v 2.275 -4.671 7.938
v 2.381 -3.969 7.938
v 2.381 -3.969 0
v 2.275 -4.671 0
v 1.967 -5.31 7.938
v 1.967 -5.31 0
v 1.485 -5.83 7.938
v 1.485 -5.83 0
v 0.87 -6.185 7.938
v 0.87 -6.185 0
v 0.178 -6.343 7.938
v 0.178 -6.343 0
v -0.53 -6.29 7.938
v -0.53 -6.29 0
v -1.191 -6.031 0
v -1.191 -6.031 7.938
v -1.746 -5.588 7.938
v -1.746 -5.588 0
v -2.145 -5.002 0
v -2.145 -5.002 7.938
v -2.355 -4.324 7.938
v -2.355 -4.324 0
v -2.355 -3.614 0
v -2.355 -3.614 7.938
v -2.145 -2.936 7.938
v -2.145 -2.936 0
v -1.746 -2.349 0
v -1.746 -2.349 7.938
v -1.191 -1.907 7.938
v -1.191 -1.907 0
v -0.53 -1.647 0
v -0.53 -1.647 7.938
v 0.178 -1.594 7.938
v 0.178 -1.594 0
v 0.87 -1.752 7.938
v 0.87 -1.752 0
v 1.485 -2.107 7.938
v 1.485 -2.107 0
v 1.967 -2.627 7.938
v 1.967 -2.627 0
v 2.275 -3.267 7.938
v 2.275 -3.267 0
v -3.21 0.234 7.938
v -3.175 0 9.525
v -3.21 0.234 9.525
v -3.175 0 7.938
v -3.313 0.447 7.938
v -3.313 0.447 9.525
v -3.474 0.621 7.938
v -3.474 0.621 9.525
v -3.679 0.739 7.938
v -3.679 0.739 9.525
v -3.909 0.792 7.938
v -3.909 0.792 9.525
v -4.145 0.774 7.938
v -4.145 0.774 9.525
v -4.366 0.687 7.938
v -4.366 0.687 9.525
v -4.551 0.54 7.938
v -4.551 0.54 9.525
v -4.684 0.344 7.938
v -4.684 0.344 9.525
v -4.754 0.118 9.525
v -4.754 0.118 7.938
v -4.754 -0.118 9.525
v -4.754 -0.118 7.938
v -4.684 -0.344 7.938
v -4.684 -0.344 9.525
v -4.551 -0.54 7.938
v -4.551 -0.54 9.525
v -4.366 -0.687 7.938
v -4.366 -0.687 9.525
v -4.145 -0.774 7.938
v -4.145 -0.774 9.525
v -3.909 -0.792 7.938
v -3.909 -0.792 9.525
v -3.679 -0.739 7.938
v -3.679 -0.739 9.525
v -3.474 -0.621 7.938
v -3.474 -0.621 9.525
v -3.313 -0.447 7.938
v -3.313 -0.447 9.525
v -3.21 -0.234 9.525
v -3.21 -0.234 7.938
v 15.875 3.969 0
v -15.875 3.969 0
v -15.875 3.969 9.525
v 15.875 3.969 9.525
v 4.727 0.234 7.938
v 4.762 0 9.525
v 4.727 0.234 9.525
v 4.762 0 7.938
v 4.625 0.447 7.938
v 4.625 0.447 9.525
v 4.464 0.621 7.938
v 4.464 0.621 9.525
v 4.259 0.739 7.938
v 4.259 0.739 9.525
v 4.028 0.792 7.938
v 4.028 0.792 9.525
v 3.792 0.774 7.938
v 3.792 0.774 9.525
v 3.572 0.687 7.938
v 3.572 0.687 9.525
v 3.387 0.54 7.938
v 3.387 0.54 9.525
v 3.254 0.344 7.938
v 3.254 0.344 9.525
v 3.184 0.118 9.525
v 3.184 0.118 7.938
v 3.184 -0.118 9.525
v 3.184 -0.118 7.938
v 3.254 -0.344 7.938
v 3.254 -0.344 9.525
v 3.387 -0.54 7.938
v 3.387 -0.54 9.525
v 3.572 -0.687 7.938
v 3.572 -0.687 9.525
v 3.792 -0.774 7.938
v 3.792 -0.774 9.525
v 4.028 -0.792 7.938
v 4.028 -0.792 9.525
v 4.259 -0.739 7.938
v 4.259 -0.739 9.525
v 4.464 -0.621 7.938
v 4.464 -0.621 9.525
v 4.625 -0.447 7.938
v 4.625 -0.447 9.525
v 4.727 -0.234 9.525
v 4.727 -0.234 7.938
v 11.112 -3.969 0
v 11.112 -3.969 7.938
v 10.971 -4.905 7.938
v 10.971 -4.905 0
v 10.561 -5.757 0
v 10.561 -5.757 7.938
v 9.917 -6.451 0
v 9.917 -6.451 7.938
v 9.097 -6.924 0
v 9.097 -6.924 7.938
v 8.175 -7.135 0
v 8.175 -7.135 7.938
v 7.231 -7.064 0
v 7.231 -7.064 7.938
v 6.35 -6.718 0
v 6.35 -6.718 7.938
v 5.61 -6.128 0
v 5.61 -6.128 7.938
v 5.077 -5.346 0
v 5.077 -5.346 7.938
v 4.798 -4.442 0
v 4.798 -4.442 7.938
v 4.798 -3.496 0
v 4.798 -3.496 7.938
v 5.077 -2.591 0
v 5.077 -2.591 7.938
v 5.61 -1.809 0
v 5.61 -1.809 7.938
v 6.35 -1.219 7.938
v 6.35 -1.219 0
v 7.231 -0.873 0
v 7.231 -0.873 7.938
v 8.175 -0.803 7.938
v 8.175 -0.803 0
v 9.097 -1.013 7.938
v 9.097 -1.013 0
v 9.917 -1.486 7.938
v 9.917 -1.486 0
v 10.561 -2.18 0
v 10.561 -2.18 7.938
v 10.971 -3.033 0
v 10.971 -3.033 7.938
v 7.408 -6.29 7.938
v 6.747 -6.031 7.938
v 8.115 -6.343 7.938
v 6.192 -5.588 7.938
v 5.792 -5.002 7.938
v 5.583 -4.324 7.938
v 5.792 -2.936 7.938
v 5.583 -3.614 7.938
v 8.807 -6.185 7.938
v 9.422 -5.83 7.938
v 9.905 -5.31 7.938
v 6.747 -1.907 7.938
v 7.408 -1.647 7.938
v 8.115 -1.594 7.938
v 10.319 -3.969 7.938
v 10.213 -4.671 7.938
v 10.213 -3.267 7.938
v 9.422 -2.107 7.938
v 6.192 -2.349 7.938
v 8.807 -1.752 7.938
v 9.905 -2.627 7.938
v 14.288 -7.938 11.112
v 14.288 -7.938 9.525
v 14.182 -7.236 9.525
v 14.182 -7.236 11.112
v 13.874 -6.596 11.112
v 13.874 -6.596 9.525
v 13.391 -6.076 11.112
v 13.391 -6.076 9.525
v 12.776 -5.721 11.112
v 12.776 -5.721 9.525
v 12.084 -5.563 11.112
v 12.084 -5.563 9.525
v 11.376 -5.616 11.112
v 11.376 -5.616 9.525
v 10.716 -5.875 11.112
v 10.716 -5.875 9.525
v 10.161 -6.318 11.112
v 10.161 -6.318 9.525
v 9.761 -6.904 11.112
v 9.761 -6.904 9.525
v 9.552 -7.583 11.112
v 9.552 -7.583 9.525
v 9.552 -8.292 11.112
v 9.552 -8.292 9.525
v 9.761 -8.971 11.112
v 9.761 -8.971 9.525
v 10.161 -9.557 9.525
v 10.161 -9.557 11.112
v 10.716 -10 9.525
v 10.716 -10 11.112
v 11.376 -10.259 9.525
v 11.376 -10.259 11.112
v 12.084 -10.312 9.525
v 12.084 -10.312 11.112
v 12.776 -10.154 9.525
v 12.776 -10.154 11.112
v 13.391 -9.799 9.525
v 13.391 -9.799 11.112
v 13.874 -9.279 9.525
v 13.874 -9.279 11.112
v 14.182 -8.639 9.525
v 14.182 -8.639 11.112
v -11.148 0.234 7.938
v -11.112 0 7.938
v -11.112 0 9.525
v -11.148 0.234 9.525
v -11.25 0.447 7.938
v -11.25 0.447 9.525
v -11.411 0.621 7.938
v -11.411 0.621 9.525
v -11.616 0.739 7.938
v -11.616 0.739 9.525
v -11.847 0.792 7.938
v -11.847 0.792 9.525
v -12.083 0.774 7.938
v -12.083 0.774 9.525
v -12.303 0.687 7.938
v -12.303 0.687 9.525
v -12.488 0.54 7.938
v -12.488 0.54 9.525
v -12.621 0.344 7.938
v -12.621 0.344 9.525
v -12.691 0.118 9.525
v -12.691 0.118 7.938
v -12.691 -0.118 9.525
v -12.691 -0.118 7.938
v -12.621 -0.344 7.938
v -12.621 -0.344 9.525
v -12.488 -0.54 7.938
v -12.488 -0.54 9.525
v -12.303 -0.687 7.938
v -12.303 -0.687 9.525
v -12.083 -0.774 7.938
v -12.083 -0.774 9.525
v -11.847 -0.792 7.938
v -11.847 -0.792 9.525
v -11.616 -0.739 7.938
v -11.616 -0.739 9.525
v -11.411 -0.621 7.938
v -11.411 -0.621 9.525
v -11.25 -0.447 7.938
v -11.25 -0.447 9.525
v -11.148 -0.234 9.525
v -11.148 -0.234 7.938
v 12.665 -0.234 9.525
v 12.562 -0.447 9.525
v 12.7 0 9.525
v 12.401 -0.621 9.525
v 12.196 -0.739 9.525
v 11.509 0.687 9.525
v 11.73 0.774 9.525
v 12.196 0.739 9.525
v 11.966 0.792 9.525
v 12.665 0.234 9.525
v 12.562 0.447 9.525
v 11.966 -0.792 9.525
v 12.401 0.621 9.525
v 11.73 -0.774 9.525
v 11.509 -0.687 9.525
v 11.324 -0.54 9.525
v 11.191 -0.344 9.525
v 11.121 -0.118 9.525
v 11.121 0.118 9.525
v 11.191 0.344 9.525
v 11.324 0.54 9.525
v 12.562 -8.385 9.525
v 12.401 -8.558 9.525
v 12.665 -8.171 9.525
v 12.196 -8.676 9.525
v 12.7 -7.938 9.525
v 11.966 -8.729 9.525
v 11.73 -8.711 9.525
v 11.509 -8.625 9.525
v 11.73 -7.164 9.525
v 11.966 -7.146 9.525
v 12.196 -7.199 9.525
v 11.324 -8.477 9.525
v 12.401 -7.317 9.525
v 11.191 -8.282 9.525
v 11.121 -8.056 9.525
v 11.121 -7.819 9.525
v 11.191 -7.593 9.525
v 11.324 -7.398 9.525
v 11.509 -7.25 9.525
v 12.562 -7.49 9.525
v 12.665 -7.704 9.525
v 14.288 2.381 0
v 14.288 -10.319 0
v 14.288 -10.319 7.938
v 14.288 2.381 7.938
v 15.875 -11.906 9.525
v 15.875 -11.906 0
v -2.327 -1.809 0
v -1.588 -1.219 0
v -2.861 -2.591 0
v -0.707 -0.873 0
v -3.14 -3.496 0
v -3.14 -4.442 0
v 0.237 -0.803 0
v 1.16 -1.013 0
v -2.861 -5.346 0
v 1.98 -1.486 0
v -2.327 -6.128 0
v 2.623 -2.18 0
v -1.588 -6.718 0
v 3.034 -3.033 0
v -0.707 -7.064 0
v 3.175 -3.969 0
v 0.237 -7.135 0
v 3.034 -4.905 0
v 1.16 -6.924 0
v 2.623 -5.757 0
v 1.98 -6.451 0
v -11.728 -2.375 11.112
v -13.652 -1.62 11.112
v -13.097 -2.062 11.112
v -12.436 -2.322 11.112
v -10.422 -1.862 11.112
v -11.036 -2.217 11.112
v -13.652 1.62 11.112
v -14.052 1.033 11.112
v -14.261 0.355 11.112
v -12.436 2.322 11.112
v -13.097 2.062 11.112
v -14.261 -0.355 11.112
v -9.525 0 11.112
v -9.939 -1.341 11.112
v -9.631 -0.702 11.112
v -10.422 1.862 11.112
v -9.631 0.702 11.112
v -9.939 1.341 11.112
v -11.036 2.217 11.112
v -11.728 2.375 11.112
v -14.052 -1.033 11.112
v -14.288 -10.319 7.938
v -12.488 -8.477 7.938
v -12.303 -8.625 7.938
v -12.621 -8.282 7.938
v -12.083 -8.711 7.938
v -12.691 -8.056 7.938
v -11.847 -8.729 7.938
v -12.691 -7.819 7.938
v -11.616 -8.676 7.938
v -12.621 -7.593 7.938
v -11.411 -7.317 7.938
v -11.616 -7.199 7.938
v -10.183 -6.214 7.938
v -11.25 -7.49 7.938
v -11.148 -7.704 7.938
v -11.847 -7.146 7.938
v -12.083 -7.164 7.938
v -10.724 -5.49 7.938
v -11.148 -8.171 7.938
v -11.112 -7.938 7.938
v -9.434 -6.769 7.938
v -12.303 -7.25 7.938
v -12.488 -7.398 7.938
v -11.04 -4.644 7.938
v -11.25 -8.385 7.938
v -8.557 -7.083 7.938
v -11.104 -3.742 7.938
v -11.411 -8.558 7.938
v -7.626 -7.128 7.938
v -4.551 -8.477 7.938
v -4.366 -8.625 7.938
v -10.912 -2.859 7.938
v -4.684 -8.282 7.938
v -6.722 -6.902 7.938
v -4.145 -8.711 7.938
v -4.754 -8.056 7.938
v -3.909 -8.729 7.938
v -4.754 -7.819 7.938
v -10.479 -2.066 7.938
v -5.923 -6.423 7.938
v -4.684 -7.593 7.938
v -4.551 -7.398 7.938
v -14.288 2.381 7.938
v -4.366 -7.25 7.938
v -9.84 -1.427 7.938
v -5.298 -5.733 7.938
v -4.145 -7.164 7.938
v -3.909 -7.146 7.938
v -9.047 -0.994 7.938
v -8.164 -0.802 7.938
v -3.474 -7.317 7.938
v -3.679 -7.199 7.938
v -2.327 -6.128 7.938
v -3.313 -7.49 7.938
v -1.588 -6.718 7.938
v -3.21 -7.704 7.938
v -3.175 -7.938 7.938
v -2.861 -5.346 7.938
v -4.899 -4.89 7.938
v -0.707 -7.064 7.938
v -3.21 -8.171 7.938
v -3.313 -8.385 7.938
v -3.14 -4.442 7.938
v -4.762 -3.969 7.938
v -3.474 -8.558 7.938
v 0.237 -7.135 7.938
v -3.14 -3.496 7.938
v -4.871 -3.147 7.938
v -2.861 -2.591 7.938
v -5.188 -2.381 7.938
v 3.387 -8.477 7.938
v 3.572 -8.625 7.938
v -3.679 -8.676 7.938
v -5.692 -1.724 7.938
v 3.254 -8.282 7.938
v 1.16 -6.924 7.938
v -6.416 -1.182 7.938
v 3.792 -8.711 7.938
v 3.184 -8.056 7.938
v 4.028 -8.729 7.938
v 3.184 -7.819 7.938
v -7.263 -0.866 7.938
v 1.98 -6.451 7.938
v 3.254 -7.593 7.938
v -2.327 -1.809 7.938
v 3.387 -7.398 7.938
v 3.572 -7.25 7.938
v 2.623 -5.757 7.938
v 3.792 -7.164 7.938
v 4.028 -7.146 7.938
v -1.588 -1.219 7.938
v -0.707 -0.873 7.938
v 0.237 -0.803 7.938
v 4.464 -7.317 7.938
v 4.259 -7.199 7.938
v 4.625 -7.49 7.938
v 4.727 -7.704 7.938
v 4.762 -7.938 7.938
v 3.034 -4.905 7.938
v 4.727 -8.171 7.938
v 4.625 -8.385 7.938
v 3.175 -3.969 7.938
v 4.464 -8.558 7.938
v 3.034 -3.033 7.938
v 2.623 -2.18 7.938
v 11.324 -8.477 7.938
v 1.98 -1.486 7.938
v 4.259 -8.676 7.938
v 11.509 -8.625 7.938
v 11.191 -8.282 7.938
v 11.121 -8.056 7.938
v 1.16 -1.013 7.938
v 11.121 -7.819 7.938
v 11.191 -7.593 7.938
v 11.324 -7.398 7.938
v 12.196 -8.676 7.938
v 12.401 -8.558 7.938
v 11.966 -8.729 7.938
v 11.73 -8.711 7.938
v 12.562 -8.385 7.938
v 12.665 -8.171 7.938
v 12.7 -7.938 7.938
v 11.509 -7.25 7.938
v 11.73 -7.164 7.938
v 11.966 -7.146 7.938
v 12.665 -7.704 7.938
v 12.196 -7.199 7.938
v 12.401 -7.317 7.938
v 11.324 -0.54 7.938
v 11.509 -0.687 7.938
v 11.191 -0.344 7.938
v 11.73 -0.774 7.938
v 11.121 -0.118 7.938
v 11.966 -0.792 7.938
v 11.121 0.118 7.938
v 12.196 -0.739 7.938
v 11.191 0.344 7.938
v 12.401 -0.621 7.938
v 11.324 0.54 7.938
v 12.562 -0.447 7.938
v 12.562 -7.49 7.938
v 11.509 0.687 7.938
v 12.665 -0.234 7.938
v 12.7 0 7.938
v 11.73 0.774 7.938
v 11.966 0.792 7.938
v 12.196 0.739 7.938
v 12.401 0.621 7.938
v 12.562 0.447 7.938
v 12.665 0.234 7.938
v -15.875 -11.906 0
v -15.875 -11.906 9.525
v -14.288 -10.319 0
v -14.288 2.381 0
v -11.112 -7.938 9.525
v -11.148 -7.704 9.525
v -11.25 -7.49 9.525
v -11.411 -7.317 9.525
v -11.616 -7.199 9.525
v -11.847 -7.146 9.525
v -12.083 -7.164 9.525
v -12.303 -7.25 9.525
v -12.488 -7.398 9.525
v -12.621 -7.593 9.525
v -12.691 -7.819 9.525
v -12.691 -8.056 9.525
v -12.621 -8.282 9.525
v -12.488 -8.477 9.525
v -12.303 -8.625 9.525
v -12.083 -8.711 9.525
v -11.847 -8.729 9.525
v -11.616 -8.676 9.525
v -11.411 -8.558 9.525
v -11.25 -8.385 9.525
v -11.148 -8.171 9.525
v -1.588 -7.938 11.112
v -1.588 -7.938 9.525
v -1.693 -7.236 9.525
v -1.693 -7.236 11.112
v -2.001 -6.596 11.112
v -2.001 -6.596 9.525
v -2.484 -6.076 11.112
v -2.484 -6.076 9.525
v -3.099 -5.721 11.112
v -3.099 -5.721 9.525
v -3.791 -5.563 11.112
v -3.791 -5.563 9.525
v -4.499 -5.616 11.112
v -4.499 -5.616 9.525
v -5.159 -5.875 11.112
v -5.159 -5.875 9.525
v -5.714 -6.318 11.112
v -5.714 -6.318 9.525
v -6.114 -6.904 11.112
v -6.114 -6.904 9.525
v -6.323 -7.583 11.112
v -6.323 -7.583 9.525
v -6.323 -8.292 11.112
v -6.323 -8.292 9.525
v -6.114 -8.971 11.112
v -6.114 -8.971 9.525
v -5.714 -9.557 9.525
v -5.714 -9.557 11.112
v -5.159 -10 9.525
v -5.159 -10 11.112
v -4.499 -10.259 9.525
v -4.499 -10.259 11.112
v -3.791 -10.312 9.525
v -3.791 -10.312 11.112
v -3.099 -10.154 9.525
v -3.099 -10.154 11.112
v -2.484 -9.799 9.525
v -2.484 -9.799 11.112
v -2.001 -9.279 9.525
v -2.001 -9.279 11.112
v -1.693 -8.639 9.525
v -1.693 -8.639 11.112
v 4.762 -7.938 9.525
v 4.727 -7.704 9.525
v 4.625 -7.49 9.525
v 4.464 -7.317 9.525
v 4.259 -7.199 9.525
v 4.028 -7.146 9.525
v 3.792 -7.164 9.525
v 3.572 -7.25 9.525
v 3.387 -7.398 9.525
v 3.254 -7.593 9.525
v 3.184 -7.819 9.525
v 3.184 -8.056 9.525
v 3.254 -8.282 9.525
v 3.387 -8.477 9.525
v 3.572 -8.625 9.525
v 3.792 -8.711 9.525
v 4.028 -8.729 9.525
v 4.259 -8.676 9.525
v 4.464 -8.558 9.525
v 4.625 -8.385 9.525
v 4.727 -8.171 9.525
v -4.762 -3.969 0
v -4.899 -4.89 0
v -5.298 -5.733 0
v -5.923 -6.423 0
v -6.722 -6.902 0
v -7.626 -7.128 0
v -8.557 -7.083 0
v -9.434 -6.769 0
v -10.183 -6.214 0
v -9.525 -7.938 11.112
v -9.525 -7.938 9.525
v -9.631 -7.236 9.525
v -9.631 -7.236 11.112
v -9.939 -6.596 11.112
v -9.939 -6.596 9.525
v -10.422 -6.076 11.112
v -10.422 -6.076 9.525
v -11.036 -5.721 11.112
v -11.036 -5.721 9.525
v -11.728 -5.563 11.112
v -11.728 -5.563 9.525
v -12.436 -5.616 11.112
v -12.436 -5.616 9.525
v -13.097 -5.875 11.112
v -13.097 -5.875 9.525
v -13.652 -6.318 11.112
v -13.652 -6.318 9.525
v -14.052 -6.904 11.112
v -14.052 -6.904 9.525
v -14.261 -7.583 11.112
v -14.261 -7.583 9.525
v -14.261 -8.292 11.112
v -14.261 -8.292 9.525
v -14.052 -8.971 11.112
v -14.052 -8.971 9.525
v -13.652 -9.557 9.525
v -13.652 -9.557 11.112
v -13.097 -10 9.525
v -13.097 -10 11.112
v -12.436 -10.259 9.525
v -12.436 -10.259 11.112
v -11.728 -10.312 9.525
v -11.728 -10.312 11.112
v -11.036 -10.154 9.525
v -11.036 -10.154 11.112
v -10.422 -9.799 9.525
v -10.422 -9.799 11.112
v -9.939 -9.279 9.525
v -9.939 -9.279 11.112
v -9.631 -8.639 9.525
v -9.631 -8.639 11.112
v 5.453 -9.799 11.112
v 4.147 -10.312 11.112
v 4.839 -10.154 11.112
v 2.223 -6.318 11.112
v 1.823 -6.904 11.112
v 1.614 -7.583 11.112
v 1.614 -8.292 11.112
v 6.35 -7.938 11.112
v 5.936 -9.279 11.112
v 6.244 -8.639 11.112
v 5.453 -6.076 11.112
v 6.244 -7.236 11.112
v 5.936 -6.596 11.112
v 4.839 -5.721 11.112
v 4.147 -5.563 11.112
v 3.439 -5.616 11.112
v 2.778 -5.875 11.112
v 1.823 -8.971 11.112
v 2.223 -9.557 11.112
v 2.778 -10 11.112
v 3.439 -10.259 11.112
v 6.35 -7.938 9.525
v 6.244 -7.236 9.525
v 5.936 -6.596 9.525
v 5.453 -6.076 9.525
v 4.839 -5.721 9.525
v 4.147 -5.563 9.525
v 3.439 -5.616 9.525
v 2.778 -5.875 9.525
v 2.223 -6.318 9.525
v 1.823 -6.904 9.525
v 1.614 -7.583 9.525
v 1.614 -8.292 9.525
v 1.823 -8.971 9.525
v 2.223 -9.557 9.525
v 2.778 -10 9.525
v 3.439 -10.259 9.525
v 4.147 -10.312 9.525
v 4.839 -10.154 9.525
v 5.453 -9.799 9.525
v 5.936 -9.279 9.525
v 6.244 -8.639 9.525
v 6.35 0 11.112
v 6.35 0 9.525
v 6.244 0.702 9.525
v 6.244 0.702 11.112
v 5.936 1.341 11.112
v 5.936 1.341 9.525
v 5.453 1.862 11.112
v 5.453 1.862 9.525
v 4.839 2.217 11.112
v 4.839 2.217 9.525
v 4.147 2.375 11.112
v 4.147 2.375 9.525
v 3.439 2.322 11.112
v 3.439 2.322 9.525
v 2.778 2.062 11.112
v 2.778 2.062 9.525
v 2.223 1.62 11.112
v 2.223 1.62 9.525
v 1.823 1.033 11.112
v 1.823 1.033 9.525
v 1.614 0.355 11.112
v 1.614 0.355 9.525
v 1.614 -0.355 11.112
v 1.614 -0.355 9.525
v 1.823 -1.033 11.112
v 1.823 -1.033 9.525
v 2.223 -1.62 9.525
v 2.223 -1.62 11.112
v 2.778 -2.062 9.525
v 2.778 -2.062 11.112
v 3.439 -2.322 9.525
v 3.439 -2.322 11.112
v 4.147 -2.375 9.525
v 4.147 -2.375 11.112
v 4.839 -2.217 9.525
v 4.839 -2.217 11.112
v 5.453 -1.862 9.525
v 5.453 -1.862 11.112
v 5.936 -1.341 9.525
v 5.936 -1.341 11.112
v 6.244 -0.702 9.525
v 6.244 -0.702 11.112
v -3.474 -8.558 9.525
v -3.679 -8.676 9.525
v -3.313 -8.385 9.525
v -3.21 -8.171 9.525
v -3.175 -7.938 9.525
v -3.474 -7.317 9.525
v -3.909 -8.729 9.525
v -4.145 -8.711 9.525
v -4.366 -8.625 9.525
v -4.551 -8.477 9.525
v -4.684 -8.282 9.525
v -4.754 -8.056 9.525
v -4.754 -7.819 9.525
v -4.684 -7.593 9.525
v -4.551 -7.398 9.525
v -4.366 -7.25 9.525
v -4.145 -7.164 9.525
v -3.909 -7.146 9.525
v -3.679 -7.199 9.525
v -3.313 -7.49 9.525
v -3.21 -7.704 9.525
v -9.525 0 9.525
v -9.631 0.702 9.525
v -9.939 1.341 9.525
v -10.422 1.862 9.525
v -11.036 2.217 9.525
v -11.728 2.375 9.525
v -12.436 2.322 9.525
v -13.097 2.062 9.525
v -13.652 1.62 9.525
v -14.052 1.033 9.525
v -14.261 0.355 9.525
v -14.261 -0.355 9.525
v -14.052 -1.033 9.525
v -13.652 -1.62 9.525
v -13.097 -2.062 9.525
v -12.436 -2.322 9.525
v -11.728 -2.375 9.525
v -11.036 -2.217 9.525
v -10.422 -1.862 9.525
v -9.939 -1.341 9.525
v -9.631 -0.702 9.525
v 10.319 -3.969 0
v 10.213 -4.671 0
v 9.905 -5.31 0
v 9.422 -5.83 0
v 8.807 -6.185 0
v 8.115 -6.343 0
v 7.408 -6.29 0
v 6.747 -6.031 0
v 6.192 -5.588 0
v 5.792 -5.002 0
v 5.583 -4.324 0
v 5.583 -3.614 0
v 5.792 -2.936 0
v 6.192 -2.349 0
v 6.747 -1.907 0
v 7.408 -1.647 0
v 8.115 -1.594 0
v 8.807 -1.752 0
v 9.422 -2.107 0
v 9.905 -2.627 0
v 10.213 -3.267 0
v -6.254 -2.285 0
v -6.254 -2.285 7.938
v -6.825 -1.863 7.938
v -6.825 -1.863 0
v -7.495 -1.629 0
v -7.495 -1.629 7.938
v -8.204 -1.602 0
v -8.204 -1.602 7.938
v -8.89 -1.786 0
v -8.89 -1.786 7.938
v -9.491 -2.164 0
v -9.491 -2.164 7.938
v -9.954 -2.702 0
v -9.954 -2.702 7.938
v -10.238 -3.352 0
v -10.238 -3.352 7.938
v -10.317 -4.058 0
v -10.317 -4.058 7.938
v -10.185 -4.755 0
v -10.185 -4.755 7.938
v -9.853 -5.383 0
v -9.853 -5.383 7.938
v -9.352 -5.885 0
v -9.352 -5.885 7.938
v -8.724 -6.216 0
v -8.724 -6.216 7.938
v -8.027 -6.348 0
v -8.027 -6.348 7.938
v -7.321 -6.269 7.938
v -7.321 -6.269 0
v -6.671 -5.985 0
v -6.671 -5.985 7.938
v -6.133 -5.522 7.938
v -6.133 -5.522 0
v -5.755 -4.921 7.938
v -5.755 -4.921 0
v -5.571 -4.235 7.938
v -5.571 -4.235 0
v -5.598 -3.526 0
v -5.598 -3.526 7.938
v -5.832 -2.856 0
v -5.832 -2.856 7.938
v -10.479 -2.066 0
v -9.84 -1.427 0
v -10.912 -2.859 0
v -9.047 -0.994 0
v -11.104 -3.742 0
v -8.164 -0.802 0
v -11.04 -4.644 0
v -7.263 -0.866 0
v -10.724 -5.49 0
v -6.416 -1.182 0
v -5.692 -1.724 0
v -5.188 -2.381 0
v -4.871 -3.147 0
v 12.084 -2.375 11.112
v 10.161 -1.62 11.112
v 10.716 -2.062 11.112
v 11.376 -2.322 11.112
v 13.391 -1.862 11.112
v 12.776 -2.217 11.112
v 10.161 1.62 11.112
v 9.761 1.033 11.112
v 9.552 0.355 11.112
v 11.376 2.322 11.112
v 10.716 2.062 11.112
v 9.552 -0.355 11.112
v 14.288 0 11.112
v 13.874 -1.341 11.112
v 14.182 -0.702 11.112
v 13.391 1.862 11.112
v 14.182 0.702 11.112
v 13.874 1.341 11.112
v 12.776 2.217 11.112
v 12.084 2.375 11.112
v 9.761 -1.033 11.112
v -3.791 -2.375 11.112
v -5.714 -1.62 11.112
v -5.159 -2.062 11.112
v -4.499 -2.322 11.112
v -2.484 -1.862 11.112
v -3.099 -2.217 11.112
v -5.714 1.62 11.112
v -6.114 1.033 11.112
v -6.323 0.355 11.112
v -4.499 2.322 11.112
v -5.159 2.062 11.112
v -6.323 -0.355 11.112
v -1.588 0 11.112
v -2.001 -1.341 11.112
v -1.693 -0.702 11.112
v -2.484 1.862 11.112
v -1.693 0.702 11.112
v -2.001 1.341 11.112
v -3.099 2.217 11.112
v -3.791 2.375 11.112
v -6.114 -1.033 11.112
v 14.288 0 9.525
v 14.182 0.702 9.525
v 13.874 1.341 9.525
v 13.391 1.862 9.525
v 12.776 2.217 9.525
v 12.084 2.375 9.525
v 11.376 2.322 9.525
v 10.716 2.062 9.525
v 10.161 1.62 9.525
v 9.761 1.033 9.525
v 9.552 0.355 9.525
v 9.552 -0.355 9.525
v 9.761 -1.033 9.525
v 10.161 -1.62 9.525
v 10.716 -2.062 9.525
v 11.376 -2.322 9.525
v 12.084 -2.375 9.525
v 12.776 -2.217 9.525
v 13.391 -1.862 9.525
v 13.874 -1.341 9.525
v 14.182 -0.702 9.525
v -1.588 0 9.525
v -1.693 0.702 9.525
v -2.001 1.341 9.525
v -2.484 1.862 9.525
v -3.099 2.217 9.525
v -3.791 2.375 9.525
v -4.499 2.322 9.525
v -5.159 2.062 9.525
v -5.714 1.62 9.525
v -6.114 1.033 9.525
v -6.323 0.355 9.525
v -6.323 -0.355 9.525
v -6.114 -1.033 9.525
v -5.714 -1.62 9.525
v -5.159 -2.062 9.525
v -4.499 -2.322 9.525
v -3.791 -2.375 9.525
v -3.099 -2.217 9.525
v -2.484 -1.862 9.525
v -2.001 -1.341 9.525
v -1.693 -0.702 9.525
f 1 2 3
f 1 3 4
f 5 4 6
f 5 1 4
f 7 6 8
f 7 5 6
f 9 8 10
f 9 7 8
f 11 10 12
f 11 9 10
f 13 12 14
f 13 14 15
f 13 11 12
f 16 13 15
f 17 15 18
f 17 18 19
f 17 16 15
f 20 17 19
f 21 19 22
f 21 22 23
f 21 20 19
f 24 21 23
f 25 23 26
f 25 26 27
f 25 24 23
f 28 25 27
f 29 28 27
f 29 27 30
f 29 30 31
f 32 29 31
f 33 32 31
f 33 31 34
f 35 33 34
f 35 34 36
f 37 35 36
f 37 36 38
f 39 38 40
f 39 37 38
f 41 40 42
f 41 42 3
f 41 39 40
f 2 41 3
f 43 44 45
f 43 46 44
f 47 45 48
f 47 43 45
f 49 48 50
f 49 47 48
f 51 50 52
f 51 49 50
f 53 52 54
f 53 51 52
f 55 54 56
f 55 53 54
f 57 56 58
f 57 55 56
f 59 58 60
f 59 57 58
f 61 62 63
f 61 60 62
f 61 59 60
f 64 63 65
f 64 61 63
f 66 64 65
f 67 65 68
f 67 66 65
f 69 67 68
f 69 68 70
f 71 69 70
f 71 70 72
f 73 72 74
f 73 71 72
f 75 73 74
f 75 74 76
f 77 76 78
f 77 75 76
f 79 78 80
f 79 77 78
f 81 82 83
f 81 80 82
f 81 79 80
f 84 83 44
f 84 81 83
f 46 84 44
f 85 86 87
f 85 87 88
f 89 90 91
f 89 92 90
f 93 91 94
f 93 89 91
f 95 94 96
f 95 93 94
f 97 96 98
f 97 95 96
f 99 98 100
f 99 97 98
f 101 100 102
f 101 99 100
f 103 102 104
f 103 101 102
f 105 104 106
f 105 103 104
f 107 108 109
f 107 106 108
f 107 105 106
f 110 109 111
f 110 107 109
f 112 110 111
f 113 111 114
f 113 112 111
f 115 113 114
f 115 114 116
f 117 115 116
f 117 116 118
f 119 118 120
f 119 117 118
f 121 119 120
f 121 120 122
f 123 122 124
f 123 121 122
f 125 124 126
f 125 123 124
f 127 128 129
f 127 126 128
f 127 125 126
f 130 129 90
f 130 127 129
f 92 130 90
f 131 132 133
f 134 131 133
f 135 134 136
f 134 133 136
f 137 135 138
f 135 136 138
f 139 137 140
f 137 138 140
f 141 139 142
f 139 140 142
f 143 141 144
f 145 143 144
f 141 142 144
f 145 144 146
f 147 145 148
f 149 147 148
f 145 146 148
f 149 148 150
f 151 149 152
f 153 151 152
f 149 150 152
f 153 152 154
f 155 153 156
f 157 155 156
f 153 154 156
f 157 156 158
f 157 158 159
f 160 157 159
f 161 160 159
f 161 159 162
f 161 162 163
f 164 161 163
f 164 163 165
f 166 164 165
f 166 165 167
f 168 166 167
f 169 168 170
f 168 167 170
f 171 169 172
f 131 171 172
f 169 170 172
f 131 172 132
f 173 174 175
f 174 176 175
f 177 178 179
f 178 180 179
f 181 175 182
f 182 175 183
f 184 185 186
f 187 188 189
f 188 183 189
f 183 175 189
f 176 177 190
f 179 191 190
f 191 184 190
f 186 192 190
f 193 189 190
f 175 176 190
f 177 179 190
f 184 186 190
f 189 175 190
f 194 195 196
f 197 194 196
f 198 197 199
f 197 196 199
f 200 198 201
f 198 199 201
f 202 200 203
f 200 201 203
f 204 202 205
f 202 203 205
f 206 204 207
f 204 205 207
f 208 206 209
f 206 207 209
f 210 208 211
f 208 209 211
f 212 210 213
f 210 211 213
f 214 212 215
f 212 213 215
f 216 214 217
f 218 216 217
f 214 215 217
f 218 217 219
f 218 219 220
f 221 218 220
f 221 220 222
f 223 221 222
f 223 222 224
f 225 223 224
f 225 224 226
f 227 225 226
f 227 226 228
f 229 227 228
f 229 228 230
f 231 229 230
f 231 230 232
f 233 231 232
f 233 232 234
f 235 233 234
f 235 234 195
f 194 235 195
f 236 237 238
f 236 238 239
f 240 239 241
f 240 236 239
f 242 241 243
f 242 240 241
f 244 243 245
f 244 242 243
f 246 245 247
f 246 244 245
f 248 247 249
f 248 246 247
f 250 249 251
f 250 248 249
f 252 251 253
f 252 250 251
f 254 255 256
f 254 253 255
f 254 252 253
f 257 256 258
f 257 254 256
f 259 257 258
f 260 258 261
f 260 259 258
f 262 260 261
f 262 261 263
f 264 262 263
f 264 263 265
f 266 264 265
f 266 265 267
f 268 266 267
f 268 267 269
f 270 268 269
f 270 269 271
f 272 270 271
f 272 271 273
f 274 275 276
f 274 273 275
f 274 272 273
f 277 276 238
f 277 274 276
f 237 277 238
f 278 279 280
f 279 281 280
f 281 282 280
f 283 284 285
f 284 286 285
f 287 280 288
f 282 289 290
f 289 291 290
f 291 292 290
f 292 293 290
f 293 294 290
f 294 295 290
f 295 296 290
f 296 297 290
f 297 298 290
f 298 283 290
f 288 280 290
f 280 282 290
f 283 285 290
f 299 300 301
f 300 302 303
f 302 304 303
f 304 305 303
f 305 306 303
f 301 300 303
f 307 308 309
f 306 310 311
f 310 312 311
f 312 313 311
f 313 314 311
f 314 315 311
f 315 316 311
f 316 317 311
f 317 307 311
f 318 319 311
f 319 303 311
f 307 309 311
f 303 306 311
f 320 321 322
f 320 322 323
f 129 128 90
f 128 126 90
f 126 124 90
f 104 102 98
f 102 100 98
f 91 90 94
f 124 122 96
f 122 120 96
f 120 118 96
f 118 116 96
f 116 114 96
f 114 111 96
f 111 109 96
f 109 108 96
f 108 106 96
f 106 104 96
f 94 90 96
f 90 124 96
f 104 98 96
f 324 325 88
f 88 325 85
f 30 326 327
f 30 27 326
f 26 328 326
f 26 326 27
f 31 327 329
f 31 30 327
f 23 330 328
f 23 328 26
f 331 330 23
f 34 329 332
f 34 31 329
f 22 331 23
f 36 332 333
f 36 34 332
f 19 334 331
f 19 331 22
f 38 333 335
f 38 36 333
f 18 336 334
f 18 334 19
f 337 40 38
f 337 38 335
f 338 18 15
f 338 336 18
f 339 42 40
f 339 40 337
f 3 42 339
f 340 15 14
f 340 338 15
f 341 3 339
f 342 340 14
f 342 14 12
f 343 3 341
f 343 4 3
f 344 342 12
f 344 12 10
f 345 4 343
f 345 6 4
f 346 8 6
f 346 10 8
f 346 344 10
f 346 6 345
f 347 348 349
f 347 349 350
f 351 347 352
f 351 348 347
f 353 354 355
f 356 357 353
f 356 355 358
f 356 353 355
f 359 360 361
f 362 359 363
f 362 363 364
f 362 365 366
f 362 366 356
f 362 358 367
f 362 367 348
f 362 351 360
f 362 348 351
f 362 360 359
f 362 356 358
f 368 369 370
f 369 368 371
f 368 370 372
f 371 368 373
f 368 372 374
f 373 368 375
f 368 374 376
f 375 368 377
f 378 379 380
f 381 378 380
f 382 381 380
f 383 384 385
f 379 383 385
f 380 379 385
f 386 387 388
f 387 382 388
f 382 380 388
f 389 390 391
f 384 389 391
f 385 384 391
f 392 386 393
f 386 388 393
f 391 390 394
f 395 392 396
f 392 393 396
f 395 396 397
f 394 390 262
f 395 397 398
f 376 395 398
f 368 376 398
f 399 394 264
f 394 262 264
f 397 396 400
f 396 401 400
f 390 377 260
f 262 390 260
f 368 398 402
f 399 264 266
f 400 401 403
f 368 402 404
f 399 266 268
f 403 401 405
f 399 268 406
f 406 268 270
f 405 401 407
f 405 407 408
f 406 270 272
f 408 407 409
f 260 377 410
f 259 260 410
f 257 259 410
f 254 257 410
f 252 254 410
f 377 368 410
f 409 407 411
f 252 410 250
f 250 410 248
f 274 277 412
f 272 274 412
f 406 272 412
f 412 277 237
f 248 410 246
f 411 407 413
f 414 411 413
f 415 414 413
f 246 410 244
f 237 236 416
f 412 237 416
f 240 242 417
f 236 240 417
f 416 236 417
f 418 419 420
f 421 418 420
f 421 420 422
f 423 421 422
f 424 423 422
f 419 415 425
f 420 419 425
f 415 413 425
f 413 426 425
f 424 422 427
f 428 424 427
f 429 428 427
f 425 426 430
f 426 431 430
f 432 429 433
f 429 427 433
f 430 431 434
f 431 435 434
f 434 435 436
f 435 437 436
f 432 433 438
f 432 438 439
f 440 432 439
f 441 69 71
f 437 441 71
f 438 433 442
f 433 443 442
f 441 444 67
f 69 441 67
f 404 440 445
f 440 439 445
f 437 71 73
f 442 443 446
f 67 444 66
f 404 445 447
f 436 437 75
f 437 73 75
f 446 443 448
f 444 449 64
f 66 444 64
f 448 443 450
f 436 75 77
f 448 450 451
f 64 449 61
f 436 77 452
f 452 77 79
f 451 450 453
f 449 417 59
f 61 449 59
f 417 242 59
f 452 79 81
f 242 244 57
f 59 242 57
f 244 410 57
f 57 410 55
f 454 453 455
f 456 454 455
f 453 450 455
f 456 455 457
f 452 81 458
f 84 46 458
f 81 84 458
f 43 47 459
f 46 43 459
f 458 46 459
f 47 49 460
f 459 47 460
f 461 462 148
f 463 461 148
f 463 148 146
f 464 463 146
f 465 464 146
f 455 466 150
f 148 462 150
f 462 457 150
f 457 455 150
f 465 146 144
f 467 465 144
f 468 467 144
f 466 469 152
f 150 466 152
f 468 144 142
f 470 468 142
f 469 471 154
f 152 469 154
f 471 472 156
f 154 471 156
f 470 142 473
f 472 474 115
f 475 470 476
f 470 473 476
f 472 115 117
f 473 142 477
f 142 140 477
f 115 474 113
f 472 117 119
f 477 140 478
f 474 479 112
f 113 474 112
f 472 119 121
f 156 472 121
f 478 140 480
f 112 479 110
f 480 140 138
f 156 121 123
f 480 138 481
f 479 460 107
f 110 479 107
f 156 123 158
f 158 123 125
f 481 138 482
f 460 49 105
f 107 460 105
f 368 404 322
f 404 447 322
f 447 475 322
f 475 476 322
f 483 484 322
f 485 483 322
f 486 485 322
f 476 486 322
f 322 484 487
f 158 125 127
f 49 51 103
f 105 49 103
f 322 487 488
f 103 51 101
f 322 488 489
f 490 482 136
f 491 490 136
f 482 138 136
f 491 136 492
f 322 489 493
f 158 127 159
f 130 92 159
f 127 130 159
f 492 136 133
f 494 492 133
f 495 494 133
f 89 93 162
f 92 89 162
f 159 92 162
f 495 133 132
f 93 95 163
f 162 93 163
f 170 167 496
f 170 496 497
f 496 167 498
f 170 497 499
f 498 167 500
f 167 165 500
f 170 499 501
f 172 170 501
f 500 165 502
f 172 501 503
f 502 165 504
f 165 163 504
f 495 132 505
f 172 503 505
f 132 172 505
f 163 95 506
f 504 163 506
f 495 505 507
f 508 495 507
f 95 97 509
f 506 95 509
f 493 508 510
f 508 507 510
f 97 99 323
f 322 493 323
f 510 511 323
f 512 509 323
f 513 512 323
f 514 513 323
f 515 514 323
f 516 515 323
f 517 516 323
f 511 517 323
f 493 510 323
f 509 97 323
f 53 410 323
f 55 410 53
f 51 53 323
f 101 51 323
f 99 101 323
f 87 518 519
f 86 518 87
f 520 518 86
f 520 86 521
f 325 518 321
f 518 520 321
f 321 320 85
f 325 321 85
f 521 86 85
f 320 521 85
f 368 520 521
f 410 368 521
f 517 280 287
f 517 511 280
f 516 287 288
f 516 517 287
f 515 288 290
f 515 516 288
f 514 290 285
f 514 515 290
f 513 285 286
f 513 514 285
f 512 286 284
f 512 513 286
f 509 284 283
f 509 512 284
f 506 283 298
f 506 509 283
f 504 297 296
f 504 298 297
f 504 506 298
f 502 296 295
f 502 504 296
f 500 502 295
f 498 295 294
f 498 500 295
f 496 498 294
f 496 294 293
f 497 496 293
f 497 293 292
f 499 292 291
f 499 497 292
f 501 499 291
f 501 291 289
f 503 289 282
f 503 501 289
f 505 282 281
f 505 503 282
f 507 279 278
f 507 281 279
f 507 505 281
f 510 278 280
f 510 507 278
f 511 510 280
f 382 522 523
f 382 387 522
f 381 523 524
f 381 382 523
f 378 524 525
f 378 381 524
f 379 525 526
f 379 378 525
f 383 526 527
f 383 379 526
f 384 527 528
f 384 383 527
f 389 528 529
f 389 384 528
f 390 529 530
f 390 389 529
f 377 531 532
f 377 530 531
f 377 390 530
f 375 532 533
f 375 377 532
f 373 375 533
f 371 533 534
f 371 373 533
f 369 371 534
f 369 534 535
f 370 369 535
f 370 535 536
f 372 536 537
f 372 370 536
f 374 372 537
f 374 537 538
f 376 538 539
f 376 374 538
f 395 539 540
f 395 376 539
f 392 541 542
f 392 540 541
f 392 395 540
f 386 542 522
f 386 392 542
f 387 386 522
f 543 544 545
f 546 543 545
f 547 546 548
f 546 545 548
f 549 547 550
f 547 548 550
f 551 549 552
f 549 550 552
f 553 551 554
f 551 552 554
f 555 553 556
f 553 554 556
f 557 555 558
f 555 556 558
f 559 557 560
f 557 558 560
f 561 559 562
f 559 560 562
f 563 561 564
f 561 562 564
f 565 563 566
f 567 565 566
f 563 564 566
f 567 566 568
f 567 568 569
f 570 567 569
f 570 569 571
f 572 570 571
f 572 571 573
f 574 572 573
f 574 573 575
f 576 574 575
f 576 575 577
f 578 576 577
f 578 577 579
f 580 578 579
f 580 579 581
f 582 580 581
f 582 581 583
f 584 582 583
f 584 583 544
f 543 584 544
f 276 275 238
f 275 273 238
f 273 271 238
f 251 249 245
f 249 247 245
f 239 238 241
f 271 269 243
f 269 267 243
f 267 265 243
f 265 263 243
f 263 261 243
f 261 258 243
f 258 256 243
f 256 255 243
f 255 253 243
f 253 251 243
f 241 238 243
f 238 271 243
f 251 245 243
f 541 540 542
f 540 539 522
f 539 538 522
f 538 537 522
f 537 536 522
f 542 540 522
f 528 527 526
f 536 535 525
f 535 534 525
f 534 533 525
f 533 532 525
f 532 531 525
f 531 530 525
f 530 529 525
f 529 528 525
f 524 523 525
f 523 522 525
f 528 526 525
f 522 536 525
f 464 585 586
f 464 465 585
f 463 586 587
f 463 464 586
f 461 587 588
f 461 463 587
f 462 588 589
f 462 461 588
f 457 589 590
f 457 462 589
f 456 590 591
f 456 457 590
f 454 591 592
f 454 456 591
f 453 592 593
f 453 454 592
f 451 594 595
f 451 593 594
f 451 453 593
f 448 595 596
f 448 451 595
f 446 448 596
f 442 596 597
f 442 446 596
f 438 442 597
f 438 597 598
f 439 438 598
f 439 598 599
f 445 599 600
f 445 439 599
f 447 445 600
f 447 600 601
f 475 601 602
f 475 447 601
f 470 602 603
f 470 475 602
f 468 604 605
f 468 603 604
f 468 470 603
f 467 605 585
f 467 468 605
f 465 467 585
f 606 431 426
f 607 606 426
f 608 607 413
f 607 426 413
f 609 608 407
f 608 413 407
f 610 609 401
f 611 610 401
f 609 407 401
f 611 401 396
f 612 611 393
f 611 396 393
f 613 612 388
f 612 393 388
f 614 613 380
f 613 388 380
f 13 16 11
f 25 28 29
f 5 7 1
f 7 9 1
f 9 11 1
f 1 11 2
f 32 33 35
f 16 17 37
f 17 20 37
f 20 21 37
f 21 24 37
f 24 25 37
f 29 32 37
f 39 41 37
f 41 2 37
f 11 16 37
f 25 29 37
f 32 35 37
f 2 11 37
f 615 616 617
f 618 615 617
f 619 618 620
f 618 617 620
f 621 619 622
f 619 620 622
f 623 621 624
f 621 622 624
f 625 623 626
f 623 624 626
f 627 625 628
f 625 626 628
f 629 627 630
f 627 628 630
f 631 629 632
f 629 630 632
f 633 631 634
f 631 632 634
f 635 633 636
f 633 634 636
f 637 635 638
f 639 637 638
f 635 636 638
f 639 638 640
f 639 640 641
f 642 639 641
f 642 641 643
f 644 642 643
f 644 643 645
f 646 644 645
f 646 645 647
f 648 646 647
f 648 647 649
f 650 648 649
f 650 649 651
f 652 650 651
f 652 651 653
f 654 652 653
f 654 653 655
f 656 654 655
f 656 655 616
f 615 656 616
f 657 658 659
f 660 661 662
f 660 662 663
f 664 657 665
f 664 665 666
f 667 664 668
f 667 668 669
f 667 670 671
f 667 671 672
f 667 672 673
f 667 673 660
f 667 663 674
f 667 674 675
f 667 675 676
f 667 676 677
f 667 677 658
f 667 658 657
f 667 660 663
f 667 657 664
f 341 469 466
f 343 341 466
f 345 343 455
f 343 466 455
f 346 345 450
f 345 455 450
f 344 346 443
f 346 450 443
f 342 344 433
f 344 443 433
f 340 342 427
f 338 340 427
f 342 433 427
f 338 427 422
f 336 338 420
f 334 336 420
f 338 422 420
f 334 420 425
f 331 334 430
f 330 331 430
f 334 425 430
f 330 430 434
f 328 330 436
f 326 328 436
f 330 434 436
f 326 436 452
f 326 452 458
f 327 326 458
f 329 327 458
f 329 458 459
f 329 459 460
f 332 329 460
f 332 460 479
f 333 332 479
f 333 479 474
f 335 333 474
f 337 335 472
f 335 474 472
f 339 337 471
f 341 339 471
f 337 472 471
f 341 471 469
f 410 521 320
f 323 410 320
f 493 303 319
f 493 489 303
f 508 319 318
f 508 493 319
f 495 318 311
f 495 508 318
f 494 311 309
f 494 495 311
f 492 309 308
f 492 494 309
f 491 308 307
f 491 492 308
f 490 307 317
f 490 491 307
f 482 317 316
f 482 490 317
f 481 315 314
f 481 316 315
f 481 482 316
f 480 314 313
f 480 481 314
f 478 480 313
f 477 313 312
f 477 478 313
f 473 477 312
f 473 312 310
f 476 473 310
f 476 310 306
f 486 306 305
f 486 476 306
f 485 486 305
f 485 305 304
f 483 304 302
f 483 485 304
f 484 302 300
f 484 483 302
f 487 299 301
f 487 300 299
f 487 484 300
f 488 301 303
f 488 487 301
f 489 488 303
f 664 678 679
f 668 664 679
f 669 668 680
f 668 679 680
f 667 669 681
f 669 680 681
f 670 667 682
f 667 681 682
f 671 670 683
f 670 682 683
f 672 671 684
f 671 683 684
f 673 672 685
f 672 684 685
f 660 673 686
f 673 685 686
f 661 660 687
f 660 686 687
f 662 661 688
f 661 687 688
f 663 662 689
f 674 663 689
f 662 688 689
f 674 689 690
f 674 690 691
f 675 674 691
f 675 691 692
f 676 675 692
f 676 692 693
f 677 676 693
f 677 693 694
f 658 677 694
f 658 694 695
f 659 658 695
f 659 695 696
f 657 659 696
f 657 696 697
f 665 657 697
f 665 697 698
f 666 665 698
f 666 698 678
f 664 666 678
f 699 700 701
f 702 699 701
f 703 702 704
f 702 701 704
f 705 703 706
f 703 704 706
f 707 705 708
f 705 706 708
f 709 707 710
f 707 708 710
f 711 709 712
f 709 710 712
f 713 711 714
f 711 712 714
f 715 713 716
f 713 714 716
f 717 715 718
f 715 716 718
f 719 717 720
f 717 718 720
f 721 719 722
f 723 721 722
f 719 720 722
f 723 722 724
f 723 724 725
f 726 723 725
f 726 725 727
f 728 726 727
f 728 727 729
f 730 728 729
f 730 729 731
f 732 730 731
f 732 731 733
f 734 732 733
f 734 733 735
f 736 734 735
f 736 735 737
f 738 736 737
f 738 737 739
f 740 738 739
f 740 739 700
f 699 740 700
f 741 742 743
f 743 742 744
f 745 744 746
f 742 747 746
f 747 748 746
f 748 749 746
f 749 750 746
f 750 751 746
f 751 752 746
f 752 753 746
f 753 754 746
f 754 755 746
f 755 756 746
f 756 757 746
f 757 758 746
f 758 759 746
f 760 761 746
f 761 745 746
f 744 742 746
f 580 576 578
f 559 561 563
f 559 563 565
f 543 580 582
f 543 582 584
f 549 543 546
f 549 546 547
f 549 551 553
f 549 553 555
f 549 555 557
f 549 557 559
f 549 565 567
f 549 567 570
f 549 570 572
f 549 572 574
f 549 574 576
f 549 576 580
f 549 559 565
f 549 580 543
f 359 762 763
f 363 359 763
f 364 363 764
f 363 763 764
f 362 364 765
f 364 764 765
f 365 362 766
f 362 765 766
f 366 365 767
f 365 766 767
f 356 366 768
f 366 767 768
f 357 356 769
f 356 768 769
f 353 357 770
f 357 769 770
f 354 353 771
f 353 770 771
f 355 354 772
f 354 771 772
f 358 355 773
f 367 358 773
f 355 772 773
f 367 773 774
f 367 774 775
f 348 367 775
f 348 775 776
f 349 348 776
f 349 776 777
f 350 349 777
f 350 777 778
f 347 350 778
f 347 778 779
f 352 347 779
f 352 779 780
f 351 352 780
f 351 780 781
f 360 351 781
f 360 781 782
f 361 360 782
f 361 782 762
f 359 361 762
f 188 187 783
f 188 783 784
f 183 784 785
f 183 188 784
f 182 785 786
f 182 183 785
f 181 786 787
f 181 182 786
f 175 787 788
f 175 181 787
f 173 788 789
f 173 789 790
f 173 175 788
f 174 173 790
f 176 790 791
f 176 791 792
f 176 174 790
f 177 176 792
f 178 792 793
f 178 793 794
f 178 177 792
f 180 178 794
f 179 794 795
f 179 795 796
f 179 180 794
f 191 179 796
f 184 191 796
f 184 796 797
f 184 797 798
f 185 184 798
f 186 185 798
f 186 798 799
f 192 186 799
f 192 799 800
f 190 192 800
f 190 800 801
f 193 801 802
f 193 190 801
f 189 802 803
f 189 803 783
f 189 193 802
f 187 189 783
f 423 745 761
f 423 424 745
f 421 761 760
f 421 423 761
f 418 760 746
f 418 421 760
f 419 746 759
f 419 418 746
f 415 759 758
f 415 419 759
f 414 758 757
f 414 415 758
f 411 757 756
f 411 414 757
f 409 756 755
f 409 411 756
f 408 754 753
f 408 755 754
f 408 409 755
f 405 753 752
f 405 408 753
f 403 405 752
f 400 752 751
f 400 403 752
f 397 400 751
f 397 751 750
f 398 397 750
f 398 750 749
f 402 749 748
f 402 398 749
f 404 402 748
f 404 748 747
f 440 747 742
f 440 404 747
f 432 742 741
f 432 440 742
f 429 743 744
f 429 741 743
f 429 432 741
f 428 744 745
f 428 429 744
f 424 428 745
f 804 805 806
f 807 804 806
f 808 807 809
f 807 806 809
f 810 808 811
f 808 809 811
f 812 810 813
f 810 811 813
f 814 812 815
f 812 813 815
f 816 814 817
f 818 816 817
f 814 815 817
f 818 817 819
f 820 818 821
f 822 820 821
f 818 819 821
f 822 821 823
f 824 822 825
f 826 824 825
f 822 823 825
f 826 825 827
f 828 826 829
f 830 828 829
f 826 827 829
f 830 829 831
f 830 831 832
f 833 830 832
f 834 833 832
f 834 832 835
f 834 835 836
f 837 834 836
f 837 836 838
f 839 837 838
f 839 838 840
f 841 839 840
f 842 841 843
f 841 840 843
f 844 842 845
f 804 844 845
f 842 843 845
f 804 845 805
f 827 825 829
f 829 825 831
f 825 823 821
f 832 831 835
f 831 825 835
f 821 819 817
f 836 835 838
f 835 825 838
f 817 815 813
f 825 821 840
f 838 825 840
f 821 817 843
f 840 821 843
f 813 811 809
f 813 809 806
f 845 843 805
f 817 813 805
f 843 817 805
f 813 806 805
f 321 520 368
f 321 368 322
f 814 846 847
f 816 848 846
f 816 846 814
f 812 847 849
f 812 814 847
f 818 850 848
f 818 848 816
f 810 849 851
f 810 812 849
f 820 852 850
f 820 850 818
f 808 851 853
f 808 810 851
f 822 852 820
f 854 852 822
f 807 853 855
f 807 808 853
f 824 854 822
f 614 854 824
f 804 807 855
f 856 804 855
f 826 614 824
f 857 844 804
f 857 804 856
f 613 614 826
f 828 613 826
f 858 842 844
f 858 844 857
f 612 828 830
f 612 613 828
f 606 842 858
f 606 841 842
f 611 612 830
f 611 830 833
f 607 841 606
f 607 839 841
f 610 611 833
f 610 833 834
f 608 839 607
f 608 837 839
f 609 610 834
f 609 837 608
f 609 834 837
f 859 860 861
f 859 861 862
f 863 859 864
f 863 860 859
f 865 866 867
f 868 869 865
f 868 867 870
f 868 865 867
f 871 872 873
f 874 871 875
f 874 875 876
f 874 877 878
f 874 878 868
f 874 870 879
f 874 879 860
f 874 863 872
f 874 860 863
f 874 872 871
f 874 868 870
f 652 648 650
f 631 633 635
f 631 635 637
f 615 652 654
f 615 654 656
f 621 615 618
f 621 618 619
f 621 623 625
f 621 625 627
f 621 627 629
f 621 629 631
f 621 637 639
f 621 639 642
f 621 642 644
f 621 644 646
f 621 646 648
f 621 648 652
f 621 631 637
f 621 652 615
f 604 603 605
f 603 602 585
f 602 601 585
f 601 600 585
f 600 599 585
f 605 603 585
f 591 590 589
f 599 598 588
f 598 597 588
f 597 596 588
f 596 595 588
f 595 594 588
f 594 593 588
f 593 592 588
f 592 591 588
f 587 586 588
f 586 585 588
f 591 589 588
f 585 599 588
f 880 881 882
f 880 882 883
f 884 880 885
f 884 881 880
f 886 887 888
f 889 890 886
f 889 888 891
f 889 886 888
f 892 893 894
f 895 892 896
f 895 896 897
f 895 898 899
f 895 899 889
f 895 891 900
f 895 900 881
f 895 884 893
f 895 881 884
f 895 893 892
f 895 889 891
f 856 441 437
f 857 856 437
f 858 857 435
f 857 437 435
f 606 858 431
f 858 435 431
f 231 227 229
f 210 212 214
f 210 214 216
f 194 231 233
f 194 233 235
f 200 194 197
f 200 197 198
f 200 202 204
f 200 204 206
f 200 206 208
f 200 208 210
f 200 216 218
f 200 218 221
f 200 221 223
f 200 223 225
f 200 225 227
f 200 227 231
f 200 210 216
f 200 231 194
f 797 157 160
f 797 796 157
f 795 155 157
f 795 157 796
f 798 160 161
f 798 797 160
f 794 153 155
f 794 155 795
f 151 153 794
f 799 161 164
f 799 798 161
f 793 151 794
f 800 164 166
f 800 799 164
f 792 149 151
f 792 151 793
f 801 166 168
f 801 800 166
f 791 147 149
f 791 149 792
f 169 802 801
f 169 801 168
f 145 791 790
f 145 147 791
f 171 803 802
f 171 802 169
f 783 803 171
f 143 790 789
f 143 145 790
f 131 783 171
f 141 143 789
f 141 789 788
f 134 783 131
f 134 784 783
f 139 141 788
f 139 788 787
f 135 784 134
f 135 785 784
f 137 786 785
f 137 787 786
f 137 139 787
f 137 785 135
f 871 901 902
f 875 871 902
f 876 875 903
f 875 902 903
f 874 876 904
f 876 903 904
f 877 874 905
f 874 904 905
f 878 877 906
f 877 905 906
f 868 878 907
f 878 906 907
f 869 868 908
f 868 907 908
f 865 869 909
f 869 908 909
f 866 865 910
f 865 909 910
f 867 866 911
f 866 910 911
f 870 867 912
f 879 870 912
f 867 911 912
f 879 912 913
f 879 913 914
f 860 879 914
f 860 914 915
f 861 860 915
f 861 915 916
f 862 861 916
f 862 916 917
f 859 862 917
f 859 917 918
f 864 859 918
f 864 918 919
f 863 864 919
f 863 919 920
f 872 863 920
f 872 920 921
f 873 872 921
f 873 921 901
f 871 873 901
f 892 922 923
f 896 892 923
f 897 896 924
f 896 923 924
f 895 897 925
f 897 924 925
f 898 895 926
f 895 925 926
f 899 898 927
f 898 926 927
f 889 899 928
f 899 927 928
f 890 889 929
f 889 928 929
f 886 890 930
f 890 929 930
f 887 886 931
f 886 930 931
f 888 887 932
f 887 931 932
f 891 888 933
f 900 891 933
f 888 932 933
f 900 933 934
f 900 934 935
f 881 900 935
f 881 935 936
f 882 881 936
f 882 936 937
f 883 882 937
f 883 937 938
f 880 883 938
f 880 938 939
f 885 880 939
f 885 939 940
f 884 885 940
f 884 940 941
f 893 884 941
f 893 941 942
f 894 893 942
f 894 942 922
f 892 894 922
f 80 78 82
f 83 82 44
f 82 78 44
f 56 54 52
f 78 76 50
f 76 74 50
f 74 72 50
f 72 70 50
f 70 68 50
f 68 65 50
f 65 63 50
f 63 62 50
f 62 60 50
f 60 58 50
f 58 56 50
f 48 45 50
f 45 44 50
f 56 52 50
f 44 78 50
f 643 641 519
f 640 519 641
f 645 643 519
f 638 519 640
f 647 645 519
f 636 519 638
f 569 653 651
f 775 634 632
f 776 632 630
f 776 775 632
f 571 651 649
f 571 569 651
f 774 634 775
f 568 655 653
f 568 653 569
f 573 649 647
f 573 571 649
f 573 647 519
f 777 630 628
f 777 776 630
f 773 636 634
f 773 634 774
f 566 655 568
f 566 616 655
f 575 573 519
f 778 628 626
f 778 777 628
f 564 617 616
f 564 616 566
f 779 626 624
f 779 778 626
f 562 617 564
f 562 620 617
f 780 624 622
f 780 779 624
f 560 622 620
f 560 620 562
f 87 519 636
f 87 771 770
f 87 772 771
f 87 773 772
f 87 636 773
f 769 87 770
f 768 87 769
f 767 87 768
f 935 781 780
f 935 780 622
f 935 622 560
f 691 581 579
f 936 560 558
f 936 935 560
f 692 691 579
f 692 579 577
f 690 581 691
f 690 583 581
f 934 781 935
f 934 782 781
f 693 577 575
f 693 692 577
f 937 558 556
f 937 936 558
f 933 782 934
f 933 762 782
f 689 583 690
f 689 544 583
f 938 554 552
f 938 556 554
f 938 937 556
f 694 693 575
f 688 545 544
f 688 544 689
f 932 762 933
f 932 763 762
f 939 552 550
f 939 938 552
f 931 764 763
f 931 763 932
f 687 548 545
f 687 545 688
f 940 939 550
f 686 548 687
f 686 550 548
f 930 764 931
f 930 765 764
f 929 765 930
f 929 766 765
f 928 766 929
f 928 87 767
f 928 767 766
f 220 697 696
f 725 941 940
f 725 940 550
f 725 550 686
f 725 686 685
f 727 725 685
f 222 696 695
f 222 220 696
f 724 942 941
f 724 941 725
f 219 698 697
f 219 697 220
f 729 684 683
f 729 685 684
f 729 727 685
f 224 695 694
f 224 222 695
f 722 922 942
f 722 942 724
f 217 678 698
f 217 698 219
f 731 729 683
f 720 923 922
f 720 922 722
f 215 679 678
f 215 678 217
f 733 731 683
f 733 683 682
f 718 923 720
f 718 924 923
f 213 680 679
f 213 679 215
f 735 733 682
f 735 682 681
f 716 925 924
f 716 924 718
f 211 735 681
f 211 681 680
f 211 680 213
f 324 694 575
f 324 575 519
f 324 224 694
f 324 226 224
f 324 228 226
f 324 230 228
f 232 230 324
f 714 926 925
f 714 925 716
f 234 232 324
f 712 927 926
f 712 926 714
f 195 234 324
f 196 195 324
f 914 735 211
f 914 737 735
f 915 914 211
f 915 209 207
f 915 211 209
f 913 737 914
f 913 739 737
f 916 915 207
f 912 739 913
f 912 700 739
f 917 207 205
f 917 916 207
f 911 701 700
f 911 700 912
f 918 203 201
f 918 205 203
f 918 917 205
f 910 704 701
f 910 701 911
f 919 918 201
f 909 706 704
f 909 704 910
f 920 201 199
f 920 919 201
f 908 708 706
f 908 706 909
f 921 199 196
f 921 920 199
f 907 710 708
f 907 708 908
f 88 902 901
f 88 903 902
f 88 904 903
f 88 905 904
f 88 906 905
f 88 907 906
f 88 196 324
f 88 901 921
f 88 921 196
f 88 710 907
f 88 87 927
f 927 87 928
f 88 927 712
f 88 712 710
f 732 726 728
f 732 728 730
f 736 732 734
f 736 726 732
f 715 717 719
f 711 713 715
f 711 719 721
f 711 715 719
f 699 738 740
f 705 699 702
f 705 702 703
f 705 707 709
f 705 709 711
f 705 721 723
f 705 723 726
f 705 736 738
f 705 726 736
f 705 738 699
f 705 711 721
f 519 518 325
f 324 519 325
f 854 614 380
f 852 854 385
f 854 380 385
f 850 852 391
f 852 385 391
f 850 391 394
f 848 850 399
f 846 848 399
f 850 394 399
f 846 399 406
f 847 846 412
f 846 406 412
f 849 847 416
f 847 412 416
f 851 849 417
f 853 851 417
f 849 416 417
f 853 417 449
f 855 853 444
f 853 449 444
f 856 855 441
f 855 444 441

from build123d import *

# Parameters (mm, degrees)
F0_W     = 31.75
F0_H     = 15.875
F0_R     = 2.38125
F1_DEPTH = 9.525
F2_DEPTH = 11.1125
F3_T     = -1.5875
F4_R     = 3.175
F4_R_2   = 2.38125
F5_DEPTH = 7.9375


with BuildPart() as f1:
    # F0 (on Top) → F1 (new body)
    with BuildSketch(Plane.XY):
        with Locations((0, -3.96875)):
            Rectangle(F0_W, F0_H)
        with Locations((-11.90625, -7.9375)):
            Circle(F0_R, mode=Mode.SUBTRACT)
        with Locations((-3.96875, -7.9375)):
            Circle(F0_R, mode=Mode.SUBTRACT)
        with Locations((3.96875, -7.9375)):
            Circle(F0_R, mode=Mode.SUBTRACT)
        with Locations((11.90625, -7.9375)):
            Circle(F0_R, mode=Mode.SUBTRACT)
        with Locations((-11.90625, 0)):
            Circle(F0_R, mode=Mode.SUBTRACT)
        with Locations((-3.96875, 0)):
            Circle(F0_R, mode=Mode.SUBTRACT)
        with Locations((3.96875, 0)):
            Circle(F0_R, mode=Mode.SUBTRACT)
        with Locations((11.90625, 0)):
            Circle(F0_R, mode=Mode.SUBTRACT)
    extrude(amount=F1_DEPTH)

    # F0 (on Top) → F2 (join)
    with BuildSketch(Plane.XY):
        with Locations((-11.90625, 0)):
            Circle(F0_R)
        with Locations((-11.90625, -7.9375)):
            Circle(F0_R)
        with Locations((-3.96875, -7.9375)):
            Circle(F0_R)
        with Locations((-3.96875, 0)):
            Circle(F0_R)
        with Locations((3.96875, 0)):
            Circle(F0_R)
        with Locations((3.96875, -7.9375)):
            Circle(F0_R)
        with Locations((11.90625, -7.9375)):
            Circle(F0_R)
        with Locations((11.90625, 0)):
            Circle(F0_R)
    extrude(amount=F2_DEPTH)

    # F3
    f3_openings = [f1.faces().sort_by_distance(p)[0] for p in [
        (0, -3.96875, 0),
    ]]
    offset(amount=F3_T, openings=f3_openings, kind=Kind.INTERSECTION)

    # F4 (on face) → F5 (join)
    with BuildSketch(Plane(origin=(0, 0, 7.9375), x_dir=(1, 0, 0), z_dir=(0, 0, -1))):
        with BuildLine():
            ThreePointArc((-4.7625, 3.96875), (-6.7224801022, 6.9020675157), (-10.1825640303, 6.2138140303))
            Line((-10.1825640303, 6.2138140303), (-9.6212980227, 5.6525480227))
            ThreePointArc((-9.6212980227, 5.6525480227), (-7.0262350767, 6.1687381368), (-5.55625, 3.96875))
            ThreePointArc((-5.55625, 3.96875), (-5.7375118632, 3.0574850767), (-6.2537019773, 2.2849519773))
            Line((-6.2537019773, 2.2849519773), (-5.6924359697, 1.7236859697))
            ThreePointArc((-5.6924359697, 1.7236859697), (-5.0041824843, 2.7537301022), (-4.7625, 3.96875))
        make_face()
        with BuildLine():
            Line((-9.6212980227, 5.6525480227), (-10.1825640303, 6.2138140303))
            ThreePointArc((-10.1825640303, 6.2138140303), (-10.1825640303, 1.7236859697), (-5.6924359697, 1.7236859697))
            Line((-5.6924359697, 1.7236859697), (-6.2537019773, 2.2849519773))
            ThreePointArc((-6.2537019773, 2.2849519773), (-9.6212980227, 2.2849519773), (-9.6212980227, 5.6525480227))
        make_face()
        with Locations((0, 3.96875)):
            Circle(F4_R)
        with Locations((0, 3.96875)):
            Circle(F4_R_2, mode=Mode.SUBTRACT)
        with Locations((7.9375, 3.96875)):
            Circle(F4_R)
        with Locations((7.9375, 3.96875)):
            Circle(F4_R_2, mode=Mode.SUBTRACT)
    extrude(amount=F5_DEPTH)


solid = f1.part
